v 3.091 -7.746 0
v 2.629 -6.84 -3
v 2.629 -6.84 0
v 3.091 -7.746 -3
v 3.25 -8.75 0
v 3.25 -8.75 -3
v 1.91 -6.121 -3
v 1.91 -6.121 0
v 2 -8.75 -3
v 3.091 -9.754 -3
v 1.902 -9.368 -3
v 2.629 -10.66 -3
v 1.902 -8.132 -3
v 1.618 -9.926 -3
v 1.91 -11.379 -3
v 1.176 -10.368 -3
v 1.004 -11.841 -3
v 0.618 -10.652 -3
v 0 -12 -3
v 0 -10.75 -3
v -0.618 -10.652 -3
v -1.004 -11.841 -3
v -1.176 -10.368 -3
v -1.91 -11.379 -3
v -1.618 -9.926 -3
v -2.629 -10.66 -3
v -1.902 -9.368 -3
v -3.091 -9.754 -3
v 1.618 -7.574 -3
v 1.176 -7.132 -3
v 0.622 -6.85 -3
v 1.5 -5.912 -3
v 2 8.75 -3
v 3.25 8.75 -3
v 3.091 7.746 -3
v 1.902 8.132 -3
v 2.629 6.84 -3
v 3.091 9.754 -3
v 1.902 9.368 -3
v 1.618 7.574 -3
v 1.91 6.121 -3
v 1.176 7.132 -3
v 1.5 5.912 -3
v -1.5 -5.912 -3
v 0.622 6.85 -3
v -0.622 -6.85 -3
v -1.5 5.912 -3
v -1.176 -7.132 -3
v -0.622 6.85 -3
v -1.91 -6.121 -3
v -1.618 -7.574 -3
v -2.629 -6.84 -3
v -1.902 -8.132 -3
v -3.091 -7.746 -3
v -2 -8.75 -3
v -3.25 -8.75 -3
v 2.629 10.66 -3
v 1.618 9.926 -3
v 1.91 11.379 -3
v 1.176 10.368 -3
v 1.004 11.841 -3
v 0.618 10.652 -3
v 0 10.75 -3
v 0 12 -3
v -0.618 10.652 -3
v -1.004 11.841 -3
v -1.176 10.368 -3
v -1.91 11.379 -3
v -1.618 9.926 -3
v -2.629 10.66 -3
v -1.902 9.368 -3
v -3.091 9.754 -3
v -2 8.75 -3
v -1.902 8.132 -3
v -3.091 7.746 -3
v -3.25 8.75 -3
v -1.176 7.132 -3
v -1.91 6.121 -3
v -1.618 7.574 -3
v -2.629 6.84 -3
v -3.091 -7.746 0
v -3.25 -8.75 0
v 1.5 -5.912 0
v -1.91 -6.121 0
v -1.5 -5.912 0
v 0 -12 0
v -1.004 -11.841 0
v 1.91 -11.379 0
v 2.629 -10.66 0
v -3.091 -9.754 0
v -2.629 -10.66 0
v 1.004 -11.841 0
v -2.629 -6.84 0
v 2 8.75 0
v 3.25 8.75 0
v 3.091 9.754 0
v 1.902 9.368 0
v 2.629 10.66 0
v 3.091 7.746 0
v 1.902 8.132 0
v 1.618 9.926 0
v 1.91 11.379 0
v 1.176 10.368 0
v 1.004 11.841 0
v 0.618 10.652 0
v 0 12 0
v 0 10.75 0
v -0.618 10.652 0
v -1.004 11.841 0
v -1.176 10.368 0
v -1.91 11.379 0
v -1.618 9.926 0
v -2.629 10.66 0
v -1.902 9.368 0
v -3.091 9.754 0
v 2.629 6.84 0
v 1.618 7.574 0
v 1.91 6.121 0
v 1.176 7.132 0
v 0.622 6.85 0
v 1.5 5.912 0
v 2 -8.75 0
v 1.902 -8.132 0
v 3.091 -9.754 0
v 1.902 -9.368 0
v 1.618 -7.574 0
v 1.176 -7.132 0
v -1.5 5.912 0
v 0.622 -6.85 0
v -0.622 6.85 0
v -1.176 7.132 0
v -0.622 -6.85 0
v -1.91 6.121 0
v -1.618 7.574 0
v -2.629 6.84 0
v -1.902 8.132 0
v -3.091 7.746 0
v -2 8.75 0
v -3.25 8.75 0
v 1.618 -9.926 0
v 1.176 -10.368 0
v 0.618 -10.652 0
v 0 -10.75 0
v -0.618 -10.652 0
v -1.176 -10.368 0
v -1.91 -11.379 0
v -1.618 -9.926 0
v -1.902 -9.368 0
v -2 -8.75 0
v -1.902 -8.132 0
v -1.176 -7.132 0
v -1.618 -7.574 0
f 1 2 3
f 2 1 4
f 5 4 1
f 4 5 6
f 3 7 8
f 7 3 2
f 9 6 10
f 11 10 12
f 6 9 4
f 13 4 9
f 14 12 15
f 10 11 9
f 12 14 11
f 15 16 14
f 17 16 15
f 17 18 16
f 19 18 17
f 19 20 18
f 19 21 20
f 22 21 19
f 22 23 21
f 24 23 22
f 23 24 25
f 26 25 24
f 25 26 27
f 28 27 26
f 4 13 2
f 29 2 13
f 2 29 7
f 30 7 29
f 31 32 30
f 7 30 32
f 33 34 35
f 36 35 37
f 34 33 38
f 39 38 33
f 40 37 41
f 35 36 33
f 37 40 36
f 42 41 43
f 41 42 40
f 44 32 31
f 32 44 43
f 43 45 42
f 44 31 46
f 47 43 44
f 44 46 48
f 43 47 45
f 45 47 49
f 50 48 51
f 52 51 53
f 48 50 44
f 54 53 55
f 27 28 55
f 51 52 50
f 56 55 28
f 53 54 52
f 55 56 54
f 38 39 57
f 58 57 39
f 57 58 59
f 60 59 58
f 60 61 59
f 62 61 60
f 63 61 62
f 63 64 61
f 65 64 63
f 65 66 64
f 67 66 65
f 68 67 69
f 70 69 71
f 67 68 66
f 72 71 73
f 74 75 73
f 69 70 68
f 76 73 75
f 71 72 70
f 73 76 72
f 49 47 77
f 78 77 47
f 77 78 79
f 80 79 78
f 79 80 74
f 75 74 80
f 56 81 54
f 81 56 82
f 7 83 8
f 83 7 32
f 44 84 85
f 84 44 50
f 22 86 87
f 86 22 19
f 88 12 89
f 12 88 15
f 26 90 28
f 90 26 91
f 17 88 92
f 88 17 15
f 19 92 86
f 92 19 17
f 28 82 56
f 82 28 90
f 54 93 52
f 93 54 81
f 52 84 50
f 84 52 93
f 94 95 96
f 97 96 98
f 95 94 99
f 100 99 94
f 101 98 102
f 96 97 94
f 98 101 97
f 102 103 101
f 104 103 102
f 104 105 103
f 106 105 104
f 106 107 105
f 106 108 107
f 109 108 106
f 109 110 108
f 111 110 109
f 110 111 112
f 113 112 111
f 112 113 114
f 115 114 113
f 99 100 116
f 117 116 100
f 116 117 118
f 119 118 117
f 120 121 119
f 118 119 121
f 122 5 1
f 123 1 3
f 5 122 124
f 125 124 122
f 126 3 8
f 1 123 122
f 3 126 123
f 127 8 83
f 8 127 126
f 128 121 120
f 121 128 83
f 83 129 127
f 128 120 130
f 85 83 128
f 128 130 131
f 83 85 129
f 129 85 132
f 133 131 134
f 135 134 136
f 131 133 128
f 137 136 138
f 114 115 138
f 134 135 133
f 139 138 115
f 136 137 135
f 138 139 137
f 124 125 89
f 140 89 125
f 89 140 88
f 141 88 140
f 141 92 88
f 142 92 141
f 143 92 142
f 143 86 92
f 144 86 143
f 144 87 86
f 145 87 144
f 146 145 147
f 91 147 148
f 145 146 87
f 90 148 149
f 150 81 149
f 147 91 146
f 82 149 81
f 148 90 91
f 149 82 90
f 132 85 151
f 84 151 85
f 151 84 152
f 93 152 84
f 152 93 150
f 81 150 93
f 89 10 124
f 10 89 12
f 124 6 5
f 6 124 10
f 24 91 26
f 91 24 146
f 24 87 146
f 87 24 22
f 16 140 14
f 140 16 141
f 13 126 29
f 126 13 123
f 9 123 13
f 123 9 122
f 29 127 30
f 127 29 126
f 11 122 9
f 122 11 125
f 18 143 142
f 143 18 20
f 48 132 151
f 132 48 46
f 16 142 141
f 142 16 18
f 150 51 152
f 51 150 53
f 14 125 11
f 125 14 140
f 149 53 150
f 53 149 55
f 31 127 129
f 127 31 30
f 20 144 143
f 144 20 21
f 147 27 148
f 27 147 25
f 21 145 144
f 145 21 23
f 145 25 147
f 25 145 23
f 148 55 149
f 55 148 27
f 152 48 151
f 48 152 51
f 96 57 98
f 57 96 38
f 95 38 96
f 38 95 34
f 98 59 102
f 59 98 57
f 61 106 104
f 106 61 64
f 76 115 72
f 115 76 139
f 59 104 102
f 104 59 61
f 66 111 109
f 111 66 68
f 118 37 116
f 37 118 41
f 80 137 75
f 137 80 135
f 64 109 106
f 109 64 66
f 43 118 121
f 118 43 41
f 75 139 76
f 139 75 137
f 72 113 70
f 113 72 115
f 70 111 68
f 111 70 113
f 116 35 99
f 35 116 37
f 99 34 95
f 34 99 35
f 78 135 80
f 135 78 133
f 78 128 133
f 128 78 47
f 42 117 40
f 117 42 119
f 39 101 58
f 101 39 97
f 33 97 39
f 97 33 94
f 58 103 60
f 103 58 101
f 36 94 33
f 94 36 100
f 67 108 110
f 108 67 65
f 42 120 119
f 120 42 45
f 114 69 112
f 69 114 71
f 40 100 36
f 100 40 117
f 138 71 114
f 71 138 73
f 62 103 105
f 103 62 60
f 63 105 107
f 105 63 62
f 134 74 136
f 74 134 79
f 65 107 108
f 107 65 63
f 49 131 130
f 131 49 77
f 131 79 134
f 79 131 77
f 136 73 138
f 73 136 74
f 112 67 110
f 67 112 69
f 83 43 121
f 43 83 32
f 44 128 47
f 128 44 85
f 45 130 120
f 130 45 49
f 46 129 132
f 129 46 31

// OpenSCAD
additional_dst = 3;
$fn = 20;

module tube (dout, din, height){
    difference(){
        cylinder(h = height, r = dout/2);
        translate([0,0,-0.5])
        cylinder(h = additional_dst+1, r = 2);
        }
}
translate([0,0,-1.5])
cube([3,13.7,3], center=true);
translate([0, -17.5/2, -additional_dst]) tube(6.5,3,3,additional_dst);
translate([0,  17.5/2, -additional_dst]) tube(6.5,3,3,additional_dst);
